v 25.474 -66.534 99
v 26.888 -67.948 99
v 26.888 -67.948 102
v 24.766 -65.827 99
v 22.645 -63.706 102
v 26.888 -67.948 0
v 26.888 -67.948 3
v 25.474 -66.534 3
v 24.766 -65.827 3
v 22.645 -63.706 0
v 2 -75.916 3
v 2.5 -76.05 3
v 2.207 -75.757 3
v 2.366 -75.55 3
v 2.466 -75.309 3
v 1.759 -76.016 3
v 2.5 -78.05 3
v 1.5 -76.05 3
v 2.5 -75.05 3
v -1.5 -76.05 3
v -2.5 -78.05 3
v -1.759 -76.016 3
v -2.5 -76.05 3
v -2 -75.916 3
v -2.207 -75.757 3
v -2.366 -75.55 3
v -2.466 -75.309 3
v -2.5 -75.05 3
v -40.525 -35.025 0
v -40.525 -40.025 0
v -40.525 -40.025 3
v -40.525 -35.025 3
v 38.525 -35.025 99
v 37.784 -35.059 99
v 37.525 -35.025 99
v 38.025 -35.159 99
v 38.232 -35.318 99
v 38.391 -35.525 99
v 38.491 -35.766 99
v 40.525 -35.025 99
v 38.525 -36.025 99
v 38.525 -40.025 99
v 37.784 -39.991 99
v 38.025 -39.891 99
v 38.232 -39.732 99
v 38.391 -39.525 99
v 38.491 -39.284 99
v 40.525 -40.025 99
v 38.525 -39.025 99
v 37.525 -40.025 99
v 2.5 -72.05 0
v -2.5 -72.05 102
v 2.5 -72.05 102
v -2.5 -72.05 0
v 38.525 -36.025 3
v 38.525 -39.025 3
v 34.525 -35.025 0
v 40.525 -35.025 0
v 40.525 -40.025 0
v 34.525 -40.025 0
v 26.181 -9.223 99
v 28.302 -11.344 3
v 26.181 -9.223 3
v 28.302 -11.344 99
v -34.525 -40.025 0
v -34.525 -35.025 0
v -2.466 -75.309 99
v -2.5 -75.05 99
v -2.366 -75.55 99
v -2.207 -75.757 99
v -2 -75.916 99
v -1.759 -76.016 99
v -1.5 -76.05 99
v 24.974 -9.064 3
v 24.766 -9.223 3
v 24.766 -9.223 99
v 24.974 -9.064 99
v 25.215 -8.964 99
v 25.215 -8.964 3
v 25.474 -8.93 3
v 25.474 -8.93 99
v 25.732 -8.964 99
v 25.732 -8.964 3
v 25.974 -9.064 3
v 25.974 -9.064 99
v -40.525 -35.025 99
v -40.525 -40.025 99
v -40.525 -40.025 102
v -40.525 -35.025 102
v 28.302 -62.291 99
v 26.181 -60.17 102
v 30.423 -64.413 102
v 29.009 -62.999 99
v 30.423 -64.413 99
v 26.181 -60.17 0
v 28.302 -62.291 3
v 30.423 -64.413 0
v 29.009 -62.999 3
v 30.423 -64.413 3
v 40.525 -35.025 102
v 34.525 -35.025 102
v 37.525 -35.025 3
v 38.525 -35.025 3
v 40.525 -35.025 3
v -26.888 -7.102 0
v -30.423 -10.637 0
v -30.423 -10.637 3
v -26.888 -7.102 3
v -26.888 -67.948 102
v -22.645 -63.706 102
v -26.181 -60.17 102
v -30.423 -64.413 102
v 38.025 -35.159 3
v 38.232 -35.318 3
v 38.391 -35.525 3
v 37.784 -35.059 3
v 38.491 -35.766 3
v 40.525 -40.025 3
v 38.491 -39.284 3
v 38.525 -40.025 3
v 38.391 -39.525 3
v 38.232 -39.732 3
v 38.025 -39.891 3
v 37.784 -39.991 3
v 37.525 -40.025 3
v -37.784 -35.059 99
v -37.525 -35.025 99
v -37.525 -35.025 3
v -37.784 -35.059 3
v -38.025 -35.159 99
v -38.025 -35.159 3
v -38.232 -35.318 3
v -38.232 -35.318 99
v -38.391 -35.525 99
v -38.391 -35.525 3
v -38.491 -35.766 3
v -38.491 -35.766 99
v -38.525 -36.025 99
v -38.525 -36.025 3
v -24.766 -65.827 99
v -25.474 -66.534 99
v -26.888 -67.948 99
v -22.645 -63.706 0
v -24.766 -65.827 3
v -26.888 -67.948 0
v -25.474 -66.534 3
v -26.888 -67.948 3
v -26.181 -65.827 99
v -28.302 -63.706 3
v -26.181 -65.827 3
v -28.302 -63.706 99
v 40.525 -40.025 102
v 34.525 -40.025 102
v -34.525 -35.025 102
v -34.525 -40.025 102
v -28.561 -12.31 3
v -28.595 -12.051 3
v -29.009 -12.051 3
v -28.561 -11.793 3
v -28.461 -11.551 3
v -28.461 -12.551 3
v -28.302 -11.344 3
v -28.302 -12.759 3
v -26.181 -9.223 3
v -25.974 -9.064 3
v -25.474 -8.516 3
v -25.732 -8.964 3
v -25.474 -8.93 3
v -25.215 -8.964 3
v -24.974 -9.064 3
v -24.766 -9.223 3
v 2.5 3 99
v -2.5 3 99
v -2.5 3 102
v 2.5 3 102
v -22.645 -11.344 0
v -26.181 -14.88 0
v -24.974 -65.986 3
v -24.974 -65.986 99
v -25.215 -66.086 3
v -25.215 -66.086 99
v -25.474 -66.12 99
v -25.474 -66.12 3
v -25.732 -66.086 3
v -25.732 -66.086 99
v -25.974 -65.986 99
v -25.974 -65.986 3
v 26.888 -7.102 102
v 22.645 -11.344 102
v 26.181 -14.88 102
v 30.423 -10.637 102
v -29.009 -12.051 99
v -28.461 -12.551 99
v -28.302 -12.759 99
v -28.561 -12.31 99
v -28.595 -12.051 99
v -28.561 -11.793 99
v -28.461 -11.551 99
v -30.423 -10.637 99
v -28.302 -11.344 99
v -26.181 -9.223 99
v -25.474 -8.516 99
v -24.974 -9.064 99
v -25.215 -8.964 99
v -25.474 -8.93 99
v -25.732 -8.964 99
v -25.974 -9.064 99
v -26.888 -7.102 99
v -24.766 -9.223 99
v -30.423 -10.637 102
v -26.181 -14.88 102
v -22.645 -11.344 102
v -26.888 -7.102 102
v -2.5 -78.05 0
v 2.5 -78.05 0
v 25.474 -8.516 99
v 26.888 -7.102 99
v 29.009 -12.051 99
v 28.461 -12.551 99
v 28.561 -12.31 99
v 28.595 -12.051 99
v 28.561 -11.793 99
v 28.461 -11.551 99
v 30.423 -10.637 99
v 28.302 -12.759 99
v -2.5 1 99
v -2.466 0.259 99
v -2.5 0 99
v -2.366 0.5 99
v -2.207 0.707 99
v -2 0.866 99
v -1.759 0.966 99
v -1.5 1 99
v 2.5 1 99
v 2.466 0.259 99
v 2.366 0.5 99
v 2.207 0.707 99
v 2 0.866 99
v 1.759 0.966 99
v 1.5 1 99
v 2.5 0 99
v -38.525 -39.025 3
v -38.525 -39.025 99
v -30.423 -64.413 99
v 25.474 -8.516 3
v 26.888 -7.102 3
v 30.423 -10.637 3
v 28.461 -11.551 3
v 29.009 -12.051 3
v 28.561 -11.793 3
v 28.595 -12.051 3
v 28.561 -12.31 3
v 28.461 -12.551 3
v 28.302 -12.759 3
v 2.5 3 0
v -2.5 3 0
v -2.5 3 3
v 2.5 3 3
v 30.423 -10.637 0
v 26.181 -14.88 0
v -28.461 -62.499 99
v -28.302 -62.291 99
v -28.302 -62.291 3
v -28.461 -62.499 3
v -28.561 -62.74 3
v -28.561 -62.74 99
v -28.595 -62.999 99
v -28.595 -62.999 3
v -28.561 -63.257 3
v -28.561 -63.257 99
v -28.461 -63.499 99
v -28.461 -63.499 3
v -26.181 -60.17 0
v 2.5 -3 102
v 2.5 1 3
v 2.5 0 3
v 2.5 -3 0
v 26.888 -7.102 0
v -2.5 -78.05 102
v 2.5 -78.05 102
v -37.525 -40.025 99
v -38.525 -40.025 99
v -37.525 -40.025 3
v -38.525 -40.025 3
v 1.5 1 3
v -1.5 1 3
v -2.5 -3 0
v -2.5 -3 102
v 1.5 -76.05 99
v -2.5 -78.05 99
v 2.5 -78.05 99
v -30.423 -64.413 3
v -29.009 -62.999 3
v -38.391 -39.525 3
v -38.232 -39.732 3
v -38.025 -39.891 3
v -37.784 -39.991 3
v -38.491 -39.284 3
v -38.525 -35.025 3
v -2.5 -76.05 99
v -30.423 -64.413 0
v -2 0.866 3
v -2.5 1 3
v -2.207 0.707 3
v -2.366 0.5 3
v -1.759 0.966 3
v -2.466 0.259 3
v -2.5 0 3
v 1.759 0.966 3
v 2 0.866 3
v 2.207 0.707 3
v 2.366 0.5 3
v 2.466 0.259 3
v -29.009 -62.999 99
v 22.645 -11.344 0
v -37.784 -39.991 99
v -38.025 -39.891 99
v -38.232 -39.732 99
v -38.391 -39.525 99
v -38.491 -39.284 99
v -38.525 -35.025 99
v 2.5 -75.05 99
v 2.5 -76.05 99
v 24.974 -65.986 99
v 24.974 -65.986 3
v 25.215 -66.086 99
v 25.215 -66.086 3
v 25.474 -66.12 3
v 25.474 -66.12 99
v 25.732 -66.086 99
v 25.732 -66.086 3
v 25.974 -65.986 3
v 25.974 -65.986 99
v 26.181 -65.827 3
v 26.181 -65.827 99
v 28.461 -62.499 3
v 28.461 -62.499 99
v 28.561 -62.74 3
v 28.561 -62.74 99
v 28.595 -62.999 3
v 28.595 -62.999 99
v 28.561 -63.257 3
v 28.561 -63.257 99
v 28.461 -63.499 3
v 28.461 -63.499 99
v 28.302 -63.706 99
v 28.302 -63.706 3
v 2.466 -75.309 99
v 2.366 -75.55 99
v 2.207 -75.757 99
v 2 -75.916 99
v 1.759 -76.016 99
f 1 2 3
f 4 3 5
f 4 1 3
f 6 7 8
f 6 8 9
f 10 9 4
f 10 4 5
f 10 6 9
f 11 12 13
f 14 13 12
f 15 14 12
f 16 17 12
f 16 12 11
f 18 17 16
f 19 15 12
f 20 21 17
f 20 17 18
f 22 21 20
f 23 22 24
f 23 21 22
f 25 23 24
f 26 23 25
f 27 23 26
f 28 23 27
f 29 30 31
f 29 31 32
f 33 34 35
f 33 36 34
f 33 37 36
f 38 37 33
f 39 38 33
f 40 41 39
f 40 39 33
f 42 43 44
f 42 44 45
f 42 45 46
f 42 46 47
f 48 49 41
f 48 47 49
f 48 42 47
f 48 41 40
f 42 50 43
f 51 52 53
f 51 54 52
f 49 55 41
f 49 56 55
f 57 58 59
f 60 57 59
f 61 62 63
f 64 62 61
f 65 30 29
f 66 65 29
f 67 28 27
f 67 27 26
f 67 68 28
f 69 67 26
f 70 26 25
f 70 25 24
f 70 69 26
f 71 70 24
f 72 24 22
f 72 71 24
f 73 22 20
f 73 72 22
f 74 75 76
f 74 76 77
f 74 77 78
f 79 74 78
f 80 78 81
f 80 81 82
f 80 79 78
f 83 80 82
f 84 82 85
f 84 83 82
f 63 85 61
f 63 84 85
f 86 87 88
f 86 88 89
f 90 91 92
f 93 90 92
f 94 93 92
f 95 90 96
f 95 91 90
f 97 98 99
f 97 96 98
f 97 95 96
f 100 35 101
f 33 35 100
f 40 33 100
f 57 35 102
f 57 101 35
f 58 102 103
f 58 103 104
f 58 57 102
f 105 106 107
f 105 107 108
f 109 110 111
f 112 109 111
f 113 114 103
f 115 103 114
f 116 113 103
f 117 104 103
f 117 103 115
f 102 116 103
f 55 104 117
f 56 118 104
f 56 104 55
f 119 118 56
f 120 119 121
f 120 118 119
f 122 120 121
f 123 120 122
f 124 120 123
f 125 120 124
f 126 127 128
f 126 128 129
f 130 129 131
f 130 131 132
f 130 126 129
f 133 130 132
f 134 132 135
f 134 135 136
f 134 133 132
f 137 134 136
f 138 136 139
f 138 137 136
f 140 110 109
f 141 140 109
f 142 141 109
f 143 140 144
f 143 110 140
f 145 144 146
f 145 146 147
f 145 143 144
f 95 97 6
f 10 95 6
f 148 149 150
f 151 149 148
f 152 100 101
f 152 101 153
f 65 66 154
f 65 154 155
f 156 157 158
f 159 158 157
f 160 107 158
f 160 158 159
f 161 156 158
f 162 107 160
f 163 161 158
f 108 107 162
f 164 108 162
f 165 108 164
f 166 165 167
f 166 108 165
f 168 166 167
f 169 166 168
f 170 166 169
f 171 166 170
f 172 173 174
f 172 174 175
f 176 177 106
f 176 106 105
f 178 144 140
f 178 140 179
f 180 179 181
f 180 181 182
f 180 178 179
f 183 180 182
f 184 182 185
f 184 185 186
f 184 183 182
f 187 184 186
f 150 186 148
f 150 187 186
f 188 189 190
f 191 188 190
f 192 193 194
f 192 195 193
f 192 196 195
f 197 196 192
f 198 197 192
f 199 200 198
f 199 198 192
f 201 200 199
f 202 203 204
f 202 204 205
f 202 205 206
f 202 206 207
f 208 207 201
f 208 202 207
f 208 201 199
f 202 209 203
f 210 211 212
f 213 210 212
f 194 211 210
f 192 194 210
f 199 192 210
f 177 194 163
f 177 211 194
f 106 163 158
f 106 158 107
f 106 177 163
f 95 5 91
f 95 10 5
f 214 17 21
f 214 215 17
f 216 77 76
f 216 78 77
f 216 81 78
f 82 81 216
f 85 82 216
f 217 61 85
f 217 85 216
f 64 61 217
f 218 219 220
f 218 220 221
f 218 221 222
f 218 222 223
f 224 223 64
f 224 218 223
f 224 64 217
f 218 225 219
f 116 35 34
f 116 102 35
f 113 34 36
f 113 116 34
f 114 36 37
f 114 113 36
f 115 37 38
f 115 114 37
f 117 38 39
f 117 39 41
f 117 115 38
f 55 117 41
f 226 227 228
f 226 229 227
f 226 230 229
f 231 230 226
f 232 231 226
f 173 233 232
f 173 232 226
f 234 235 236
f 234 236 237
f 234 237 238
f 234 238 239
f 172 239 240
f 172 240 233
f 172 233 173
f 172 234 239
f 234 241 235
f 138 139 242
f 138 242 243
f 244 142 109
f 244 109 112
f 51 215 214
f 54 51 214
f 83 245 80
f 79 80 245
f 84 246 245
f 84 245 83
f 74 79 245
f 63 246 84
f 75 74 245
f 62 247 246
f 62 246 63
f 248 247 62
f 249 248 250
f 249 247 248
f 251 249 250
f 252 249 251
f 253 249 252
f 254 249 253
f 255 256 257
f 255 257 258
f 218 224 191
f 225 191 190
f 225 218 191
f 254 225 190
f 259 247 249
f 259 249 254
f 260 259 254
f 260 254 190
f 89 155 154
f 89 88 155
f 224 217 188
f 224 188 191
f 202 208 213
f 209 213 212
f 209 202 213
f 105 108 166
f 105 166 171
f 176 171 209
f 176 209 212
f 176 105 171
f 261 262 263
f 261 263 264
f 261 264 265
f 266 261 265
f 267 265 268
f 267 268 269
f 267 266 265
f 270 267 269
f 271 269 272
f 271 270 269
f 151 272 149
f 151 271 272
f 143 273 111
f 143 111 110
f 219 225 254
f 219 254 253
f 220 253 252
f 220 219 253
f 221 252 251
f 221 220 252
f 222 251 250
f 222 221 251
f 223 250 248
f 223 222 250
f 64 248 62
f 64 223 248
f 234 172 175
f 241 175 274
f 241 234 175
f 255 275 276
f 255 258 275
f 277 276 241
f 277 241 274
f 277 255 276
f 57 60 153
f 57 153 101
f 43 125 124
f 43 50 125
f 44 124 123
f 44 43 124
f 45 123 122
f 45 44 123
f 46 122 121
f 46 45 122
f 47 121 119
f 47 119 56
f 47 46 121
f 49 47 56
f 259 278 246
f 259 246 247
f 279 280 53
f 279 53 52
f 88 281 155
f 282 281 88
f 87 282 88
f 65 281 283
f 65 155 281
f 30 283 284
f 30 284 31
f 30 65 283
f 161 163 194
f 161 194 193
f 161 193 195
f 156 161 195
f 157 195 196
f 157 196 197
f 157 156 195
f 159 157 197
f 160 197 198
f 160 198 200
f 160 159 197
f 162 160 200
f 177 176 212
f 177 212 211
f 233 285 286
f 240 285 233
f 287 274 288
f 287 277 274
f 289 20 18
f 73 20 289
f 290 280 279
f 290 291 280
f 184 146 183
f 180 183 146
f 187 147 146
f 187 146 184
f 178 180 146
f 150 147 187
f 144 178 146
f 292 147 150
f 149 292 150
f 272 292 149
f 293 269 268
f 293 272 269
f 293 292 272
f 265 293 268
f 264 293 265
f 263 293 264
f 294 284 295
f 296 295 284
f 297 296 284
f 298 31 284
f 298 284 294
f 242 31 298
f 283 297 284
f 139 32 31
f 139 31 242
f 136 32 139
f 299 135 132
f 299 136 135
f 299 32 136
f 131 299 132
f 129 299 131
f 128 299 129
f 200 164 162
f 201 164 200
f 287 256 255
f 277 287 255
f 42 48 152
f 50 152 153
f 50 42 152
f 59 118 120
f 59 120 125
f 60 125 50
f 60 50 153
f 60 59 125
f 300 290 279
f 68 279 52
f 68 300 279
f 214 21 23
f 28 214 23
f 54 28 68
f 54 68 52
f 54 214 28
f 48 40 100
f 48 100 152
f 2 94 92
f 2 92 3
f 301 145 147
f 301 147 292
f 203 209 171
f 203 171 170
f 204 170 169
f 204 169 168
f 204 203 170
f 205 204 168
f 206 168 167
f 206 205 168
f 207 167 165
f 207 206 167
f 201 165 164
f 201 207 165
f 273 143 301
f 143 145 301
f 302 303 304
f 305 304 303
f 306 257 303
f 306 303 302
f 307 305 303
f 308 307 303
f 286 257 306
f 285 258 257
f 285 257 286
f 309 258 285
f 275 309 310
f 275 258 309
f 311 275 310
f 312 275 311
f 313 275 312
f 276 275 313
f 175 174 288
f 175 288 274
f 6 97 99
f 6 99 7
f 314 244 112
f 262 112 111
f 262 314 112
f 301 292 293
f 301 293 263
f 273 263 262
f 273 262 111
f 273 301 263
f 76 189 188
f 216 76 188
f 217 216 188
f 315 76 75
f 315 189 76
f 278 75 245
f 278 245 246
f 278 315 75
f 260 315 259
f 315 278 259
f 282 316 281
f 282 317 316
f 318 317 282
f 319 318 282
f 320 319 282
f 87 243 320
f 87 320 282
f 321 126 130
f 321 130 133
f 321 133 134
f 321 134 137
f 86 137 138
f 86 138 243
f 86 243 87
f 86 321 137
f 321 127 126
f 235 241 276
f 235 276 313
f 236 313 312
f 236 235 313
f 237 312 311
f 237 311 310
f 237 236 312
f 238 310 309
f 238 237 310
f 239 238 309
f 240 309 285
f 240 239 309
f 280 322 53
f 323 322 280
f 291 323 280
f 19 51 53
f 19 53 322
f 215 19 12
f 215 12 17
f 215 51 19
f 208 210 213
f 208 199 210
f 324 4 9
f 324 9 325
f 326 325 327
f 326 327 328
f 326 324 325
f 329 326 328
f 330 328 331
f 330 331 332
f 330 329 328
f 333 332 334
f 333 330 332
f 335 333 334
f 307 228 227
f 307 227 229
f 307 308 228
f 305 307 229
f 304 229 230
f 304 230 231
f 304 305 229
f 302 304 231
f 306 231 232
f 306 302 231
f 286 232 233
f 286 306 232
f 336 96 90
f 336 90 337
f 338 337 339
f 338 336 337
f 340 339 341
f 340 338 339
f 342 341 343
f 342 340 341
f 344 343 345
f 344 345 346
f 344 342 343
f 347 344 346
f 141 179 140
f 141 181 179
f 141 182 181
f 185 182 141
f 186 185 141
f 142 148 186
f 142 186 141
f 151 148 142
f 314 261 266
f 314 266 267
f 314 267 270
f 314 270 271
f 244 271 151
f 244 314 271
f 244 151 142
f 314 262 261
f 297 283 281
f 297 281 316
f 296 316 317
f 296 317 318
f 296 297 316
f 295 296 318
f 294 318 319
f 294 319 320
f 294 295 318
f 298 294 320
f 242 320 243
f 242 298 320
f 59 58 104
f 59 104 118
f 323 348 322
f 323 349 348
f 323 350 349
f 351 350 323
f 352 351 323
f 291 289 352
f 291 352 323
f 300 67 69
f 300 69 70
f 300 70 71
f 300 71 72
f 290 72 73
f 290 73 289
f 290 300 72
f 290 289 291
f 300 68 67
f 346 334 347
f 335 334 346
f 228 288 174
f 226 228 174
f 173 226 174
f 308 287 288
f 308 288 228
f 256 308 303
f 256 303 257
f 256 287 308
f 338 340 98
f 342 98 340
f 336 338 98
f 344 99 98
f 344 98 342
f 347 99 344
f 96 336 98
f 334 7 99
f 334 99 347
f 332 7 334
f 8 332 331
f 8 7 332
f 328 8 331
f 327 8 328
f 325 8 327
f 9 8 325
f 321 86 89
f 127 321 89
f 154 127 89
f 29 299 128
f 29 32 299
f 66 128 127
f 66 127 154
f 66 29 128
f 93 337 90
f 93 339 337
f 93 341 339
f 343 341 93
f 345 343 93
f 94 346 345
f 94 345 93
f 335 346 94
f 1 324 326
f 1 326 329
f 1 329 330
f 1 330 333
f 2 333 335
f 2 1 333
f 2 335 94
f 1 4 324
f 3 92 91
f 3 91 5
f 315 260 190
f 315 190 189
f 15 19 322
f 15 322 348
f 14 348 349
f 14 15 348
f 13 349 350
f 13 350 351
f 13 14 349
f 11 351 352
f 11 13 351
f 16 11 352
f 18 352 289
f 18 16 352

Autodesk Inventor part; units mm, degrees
ref_plane "YZ Plane" through (0, 0, 0) normal (1, 0, 0) x (0, 1, 0)
ref_plane "XZ Plane" through (0, 0, 0) normal (0, 1, 0) x (-1, 0, 0)
ref_plane "XY Plane" through (0, 0, 0) normal (0, 0, 1) x (1, 0, 0)
sketch "Sketch1" plane through (0, 0, 0) normal (0, 0, 1) x (1, 0, 0)
  line L0 (-2.5, 3) -> (2.5, 3)
  line L1 (2.5, 3) -> (2.5, -3)
  line L2 (2.5, -3) -> (-2.5, -3)
  line L3 (-2.5, -3) -> (-2.5, 3)
  point P0 (0, 0)
  dimension "d0" = 5
  dimension "d1" = 6
  dimension "d2" = 3
  dimension "d3" = 2.5
extrude "Extrusion1" add sketch "Sketch1" along normal blind 102
sketch "Sketch2" plane through (2.5, -3, 0) normal (1, 0, 0) x (0, 0, -1)
  line L0 (0, 6) -> (-102, 6) projected
  line L1 (-99, 6) -> (-3, 6)
  line L2 (-3, 6) -> (-3, 4)
  line L3 (-3, 4) -> (-99, 4)
  line L4 (-99, 4) -> (-99, 6)
  point P0 (0, 3)
  point P1 (-3, 6)
  dimension "d6" = 3
  dimension "d7" = 96
  dimension "d8" = 2
extrude "Extrusion2" cut sketch "Sketch2" against normal through all
fillet "Fillet1" radius 1 2 edges at (2.5, 1, 51) (-2.5, 1, 51)
sketch3d "3D Sketch1"
pattern_circular "Circular Pattern1" count 8 over 360 about axis through (0, -37.525, 102) along (0, 0, -1) of "Extrusion1", "Extrusion2", "Fillet1"
equation "\"d2\" = 0.5 * d1"
equation "\"d3\" = 0.5 * d0"
properties part number "1402B_Bias Coil Spacer_V1" material "ABS Plastic"
